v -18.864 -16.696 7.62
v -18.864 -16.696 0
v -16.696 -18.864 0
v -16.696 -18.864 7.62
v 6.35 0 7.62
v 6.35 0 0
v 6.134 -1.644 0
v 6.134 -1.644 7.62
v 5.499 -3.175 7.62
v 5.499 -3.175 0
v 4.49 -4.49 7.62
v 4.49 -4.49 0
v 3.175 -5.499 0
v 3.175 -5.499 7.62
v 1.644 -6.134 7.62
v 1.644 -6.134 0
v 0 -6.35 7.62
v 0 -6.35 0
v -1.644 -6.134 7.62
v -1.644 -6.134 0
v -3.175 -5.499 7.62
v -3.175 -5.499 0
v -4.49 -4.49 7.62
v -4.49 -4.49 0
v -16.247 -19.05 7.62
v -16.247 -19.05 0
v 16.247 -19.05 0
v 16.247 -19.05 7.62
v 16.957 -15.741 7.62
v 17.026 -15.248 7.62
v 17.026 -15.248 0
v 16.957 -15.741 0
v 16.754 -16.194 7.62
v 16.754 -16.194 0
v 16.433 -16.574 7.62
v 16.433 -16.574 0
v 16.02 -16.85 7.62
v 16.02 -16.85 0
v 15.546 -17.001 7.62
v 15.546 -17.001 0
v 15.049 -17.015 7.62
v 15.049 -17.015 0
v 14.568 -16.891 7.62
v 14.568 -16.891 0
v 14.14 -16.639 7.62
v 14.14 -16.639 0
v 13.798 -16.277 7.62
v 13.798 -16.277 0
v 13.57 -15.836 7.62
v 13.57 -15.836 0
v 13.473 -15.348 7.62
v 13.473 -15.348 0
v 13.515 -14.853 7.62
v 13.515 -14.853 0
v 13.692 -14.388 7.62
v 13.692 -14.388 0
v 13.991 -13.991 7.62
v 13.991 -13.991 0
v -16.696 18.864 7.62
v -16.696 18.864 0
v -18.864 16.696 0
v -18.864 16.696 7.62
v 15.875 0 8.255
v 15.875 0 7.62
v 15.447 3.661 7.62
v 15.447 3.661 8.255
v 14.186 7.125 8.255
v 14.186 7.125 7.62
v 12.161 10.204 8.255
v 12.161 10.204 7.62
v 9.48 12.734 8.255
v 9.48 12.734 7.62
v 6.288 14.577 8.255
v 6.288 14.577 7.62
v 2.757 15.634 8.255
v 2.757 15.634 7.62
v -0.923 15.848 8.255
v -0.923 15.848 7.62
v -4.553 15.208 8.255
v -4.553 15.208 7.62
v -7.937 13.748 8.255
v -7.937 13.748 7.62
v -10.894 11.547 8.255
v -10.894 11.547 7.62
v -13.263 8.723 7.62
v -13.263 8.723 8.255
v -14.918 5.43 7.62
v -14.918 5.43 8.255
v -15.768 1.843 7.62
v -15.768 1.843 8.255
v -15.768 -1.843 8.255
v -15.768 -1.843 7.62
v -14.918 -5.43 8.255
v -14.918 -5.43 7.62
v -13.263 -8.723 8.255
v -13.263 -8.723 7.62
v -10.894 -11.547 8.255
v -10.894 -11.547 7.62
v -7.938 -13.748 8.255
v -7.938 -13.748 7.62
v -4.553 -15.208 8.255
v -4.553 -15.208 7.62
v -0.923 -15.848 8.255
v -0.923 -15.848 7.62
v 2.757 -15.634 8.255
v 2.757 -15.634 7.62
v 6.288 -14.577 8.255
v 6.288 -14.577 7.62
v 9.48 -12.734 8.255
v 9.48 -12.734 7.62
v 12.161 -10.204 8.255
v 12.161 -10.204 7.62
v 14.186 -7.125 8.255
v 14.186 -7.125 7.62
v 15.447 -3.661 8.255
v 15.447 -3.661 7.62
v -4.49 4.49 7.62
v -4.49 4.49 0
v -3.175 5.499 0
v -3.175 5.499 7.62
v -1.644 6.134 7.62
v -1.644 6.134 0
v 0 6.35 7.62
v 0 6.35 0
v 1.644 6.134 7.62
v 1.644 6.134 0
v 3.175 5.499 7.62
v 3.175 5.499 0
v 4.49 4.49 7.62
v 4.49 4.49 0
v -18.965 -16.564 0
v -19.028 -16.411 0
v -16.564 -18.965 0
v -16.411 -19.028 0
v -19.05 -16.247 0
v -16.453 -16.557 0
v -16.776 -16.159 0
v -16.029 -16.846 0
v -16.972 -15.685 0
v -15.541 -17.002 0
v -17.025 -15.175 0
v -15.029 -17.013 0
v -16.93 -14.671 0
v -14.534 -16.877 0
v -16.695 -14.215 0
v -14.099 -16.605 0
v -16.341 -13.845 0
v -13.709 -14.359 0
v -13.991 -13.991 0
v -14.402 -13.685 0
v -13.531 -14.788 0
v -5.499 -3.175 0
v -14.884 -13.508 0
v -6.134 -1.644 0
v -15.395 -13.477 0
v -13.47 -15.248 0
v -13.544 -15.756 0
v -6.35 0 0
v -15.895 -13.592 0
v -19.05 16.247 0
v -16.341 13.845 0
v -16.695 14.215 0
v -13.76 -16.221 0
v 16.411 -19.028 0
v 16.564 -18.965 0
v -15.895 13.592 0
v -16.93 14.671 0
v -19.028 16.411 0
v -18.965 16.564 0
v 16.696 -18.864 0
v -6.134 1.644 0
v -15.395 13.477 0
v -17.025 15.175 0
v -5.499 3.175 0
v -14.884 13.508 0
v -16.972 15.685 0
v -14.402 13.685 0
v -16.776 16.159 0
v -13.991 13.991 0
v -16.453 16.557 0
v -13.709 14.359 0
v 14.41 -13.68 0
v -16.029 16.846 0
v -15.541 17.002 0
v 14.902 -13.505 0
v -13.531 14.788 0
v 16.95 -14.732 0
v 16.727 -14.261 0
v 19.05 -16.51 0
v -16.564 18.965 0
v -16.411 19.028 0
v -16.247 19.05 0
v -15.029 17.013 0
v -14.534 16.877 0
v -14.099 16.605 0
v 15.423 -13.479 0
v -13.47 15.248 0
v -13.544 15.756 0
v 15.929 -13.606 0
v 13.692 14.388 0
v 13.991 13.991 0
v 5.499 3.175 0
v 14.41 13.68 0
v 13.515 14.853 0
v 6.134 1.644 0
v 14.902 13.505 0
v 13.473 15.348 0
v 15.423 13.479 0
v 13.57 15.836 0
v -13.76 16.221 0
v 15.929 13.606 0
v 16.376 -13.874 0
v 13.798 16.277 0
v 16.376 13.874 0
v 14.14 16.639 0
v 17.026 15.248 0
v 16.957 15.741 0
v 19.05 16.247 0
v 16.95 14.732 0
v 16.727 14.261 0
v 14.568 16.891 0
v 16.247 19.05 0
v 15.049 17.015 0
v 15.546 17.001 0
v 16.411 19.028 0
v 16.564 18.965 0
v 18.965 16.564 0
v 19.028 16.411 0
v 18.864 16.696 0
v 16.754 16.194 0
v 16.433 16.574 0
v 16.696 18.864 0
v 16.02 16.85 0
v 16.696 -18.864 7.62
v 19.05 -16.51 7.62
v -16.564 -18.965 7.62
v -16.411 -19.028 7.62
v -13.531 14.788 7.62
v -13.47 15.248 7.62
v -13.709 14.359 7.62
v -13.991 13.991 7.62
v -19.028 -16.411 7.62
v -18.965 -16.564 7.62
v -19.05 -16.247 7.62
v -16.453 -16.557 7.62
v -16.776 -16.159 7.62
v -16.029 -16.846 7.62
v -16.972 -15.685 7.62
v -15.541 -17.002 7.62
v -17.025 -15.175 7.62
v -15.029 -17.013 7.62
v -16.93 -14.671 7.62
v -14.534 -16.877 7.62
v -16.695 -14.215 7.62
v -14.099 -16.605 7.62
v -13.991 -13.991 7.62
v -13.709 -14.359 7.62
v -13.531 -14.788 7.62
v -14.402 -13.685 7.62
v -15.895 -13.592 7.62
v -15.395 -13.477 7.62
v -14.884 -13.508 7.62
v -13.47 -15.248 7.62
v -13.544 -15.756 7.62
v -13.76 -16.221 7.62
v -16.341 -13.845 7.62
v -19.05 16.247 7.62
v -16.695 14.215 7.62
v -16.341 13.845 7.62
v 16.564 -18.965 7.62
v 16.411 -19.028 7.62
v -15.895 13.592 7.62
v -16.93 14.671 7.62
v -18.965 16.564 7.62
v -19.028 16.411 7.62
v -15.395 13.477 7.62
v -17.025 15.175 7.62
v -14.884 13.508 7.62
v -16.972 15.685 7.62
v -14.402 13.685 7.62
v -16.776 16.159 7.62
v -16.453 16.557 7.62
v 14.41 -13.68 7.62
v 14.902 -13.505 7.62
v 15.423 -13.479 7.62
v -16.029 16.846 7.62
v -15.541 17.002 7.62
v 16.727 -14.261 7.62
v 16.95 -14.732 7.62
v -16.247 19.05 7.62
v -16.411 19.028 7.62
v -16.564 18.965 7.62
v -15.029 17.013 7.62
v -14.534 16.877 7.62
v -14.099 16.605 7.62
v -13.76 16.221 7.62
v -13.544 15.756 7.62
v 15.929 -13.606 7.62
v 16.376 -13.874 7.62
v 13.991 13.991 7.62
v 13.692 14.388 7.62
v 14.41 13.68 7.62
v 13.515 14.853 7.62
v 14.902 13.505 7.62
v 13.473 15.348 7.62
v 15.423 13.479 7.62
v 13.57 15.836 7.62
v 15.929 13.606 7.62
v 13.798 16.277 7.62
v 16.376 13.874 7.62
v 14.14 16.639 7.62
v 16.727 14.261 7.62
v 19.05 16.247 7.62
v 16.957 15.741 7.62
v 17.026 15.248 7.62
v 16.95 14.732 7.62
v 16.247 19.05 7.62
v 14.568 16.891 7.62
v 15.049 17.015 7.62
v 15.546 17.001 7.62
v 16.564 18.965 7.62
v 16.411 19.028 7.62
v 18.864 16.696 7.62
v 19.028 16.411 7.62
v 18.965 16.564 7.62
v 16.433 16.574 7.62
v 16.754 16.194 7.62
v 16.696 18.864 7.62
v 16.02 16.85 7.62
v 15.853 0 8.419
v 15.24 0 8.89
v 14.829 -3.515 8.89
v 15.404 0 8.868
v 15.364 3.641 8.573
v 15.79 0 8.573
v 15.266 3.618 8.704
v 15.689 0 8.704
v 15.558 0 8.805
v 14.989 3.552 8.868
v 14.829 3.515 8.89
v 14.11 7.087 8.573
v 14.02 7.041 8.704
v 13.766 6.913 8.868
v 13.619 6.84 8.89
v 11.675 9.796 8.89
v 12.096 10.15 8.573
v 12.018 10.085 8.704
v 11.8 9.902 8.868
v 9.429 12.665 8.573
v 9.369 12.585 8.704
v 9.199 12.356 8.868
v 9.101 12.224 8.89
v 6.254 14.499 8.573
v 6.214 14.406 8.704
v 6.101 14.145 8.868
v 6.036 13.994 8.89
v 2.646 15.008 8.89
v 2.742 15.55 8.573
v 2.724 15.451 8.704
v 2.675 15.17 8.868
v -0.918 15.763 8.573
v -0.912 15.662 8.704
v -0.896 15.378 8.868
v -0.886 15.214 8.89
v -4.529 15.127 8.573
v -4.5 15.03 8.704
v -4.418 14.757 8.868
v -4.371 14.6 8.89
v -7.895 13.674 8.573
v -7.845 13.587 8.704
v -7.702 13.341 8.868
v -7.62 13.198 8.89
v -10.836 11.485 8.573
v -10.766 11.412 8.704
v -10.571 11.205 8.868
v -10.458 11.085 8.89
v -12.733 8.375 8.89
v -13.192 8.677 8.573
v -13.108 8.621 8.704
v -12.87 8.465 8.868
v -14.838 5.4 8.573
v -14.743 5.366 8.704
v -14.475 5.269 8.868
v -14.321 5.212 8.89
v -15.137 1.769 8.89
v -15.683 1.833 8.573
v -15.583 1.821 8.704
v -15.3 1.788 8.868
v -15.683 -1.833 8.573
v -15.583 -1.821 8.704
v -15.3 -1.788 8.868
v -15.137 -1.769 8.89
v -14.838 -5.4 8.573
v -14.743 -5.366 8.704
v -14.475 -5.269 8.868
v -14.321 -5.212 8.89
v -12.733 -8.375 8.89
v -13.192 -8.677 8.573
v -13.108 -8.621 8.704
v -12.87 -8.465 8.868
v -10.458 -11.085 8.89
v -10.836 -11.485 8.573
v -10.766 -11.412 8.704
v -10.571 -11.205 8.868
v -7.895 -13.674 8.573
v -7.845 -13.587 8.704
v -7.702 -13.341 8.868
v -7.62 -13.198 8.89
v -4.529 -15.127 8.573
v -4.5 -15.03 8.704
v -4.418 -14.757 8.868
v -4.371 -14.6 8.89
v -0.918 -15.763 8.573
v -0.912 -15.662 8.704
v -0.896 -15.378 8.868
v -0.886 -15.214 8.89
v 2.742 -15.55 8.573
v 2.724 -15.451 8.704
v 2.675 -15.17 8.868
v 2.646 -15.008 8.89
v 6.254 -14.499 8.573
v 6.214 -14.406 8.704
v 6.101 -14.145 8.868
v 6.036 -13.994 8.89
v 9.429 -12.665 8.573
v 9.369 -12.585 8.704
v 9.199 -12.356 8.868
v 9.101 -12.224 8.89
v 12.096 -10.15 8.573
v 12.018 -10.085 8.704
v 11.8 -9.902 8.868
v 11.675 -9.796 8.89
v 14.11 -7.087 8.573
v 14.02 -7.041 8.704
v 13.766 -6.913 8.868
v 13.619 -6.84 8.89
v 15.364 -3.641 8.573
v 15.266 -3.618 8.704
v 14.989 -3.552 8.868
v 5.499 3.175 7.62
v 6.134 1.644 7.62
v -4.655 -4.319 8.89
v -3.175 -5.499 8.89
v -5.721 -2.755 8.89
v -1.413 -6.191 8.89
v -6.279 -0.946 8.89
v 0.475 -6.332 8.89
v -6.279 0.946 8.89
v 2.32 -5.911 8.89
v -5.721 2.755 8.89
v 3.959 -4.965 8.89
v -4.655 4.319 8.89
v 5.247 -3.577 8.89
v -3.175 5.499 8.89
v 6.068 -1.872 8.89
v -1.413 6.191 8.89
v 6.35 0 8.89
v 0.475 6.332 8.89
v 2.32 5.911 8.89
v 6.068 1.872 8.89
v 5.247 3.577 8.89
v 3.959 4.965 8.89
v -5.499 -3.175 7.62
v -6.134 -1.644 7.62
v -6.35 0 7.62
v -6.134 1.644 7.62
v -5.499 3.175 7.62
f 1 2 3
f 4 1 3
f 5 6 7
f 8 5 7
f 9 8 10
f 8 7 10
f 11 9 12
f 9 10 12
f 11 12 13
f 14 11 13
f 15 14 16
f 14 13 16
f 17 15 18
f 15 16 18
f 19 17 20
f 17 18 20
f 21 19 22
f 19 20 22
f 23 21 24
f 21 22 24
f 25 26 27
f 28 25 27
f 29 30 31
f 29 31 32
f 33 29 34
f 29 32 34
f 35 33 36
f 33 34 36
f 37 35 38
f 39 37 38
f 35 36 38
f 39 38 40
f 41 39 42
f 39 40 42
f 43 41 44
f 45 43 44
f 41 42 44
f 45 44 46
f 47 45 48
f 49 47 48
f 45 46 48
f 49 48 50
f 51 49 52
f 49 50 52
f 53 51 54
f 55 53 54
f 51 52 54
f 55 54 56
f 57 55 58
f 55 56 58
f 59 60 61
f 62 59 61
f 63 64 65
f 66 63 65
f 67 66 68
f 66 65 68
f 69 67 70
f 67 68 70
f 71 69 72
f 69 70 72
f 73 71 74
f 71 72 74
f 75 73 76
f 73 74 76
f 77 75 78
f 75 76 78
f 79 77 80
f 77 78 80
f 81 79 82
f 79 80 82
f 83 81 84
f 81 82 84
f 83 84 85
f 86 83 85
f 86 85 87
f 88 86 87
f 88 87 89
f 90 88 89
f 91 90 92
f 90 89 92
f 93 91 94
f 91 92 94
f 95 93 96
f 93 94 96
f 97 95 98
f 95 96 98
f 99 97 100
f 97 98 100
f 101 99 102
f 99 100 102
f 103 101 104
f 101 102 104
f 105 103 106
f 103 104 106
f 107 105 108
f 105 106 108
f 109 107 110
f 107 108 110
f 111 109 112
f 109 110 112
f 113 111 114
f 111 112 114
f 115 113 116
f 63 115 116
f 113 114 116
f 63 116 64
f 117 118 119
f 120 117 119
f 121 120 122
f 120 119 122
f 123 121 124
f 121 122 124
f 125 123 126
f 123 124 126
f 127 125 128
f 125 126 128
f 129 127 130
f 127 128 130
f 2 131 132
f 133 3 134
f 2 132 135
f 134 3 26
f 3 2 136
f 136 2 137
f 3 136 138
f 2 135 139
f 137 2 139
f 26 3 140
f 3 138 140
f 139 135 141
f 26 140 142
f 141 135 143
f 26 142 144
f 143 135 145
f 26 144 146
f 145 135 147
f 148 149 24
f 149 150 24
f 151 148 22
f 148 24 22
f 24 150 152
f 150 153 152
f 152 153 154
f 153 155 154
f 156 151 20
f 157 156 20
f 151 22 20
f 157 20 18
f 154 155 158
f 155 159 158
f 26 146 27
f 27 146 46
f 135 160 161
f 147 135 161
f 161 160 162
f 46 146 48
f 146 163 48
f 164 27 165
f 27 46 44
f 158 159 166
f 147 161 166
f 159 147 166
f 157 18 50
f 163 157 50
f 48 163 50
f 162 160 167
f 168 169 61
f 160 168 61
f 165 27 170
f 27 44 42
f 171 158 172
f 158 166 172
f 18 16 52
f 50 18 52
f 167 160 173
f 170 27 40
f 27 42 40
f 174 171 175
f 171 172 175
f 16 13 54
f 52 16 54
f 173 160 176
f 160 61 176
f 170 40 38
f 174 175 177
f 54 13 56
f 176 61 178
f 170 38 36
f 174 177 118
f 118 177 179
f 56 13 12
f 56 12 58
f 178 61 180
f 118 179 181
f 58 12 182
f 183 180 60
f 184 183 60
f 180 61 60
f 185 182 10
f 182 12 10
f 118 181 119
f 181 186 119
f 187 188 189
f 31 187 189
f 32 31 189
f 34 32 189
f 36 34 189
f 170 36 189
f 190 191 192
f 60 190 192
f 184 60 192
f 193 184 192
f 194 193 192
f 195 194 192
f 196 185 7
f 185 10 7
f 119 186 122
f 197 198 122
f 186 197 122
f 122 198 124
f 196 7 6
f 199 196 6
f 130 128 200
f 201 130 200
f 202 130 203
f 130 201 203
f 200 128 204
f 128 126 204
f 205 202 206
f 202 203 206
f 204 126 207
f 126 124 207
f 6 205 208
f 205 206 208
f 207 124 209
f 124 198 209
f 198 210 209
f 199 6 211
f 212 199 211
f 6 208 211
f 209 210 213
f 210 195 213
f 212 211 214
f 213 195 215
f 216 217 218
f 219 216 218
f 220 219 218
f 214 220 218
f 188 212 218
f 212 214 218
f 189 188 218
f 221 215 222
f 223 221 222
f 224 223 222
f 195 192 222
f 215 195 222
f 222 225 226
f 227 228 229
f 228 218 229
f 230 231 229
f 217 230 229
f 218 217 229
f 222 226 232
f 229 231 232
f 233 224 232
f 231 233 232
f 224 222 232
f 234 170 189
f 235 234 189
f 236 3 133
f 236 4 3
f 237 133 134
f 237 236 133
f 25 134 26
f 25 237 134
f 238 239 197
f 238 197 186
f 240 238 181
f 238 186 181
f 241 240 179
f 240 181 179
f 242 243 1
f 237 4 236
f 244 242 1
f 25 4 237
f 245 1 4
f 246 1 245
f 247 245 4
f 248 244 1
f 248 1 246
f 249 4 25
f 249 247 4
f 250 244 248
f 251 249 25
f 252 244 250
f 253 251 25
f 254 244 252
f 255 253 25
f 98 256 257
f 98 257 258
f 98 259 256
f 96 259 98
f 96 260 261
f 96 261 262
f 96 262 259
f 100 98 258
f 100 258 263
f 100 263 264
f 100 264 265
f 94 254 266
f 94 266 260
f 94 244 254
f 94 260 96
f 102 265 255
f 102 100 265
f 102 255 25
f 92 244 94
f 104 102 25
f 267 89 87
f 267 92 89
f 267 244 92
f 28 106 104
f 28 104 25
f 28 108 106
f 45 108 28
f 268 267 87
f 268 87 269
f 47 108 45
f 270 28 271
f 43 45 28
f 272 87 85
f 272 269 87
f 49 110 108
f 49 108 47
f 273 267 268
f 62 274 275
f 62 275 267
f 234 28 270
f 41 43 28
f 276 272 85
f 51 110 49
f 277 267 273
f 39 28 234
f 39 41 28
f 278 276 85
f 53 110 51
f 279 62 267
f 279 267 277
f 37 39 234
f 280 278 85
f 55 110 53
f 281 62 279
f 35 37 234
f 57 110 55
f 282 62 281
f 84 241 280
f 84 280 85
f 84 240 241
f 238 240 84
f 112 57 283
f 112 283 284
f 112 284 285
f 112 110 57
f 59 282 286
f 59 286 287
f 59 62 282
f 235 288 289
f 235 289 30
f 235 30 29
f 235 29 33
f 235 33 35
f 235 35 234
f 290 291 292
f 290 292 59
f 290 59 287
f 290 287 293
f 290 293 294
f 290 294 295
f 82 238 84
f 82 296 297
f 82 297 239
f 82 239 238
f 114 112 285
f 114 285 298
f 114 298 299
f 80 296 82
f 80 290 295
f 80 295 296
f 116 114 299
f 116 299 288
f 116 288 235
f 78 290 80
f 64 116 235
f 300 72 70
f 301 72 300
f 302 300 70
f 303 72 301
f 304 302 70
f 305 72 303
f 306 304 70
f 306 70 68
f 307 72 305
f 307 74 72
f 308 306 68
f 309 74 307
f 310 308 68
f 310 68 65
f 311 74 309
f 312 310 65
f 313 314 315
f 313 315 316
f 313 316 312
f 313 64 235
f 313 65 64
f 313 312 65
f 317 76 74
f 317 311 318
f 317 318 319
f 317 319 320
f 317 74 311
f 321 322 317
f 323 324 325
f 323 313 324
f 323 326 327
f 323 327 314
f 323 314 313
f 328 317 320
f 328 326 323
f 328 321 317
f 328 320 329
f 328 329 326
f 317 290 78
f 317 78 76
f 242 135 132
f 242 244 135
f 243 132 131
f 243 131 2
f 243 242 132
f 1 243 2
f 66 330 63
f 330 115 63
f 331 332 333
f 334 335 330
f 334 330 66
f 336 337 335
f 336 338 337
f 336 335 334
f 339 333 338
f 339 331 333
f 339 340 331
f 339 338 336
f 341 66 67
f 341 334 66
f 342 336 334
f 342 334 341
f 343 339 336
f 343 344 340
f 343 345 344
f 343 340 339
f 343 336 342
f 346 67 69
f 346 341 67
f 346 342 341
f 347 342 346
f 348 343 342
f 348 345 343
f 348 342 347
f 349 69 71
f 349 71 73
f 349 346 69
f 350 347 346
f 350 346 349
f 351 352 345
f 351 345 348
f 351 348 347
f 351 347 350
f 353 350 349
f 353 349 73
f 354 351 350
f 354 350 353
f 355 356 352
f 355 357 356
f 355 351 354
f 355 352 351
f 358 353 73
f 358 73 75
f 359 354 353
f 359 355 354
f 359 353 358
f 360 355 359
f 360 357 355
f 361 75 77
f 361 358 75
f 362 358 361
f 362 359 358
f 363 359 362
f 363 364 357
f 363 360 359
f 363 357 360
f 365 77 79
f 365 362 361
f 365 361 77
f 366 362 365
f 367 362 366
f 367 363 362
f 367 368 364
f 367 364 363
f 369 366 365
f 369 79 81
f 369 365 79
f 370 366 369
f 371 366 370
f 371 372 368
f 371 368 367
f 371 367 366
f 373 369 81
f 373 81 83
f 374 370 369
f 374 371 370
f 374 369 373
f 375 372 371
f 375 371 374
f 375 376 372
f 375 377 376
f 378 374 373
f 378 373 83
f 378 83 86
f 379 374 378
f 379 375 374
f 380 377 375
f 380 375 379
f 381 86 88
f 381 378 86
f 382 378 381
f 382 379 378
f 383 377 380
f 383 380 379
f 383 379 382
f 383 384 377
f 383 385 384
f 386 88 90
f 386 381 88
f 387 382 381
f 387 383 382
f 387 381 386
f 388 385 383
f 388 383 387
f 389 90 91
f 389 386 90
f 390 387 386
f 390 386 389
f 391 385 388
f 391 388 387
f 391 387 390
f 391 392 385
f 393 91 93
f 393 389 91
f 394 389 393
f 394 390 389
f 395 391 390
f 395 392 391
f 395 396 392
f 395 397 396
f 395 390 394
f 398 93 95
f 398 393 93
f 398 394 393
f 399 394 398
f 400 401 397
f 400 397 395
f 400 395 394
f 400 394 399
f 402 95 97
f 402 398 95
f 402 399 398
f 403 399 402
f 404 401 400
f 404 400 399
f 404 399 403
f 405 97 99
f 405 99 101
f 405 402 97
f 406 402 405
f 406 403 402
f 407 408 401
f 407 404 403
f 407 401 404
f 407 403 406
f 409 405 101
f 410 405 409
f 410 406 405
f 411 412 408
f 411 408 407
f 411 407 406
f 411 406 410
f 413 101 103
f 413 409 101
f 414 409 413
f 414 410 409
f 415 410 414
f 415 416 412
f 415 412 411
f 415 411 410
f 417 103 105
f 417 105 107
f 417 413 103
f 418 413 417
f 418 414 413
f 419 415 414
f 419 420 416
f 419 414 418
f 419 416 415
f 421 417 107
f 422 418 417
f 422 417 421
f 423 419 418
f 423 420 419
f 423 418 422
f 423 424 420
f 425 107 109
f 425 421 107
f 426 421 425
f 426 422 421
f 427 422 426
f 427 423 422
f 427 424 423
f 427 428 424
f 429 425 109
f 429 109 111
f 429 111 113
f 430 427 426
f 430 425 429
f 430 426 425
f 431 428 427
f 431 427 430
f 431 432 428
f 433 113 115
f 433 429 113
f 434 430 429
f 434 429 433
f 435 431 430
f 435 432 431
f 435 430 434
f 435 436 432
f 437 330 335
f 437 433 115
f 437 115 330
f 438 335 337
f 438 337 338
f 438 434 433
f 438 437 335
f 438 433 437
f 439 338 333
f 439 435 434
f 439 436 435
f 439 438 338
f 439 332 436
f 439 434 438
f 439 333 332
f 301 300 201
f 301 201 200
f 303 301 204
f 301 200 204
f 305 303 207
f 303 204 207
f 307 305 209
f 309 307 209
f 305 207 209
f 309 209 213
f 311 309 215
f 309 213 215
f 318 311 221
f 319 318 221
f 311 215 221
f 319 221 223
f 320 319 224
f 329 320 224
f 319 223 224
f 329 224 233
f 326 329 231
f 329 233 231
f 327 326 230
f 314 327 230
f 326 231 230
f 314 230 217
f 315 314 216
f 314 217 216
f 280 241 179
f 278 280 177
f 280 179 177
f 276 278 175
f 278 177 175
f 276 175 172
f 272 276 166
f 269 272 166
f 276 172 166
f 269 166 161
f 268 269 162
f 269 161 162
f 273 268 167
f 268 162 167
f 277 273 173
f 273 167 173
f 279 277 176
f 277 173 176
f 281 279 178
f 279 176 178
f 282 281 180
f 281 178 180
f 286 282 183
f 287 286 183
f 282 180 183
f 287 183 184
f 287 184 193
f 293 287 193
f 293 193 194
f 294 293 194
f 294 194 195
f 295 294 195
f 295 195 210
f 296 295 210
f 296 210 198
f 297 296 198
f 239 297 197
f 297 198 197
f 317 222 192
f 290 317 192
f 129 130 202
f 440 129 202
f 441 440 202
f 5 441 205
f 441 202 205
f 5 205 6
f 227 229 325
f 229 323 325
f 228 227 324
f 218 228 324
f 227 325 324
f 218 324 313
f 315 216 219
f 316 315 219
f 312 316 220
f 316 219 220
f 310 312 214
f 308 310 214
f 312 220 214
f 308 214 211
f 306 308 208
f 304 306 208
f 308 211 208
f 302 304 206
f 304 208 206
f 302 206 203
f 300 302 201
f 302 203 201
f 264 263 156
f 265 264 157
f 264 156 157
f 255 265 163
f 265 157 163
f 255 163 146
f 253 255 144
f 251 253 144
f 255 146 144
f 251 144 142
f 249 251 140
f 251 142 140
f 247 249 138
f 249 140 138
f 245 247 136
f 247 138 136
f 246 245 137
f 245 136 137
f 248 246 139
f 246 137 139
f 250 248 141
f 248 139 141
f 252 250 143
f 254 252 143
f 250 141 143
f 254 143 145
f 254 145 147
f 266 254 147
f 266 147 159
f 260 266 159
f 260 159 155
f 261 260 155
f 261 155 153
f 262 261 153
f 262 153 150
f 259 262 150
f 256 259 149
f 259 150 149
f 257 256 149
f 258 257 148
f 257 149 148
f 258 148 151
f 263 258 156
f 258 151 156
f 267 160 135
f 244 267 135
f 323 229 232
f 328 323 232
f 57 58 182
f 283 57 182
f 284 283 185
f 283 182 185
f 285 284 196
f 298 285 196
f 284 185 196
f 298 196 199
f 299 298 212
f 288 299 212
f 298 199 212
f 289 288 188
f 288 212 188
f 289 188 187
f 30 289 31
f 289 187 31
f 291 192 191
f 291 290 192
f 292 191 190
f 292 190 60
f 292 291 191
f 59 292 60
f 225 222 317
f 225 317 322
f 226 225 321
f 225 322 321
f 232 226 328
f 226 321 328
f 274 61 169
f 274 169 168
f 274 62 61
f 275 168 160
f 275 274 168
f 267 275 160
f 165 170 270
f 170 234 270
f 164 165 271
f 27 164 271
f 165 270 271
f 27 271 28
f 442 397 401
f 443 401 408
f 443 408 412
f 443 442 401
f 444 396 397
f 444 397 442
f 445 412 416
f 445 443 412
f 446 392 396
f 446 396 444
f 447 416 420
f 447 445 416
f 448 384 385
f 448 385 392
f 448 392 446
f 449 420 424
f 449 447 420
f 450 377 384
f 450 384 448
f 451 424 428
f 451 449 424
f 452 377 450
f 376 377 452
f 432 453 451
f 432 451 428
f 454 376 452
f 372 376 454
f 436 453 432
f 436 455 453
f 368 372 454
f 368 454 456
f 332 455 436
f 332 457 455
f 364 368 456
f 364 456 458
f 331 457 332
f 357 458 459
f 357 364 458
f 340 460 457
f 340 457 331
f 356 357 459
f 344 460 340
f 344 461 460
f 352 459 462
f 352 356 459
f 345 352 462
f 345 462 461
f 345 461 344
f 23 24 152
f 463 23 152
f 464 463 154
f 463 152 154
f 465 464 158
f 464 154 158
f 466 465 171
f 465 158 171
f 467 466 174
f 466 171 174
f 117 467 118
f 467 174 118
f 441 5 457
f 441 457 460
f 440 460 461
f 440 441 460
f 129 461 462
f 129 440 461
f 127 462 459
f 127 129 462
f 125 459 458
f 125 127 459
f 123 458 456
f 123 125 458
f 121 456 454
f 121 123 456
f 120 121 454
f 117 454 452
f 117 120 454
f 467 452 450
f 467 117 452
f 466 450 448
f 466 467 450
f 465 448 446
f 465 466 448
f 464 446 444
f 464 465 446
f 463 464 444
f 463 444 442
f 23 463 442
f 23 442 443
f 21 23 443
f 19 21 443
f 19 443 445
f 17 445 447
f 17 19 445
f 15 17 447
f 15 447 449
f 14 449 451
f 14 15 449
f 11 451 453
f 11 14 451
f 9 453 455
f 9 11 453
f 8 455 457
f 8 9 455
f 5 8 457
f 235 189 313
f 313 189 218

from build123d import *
from build123d import SkipClean  # not in build123d's __all__

# Parameters (mm, degrees)
F1_DEPTH = 7.62
F2_R     = 15.875
F2_R_2   = 6.35
F3_DEPTH = 1.27
F4_R     = 0.635


with BuildPart() as f1:
    # F0 (on Top) → F1 (new body)
    with BuildSketch(Plane.XY):
        Polygon((16.51, 19.05), (-16.51, 19.05), (-19.05, 16.51), (-19.05, -16.51), (-16.51, -19.05), (16.51, -19.05), (19.05, -16.51), (19.05, 0), (19.05, 16.51), align=None)
        with BuildLine():
            ThreePointArc((-13.4704748936, -15.2484748936), (-16.8911327024, -15.9288860363), (-13.9912390366, -13.9912390366))
            ThreePointArc((-13.9912390366, -13.9912390366), (-13.6058170848, -14.5680637508), (-13.4704748936, -15.2484748936))
        make_face(mode=Mode.SUBTRACT)
        with BuildLine():
            ThreePointArc((17.0264748936, -15.2484748936), (14.5680637508, -16.8911327024), (13.9912390366, -13.9912390366))
            ThreePointArc((13.9912390366, -13.9912390366), (15.9288860363, -13.6058170848), (17.0264748936, -15.2484748936))
        make_face(mode=Mode.SUBTRACT)
        with BuildLine():
            ThreePointArc((-13.4704748936, 15.2484748936), (-13.6058170848, 14.5680637508), (-13.9912390366, 13.9912390366))
            ThreePointArc((-13.9912390366, 13.9912390366), (-16.8911327024, 15.9288860363), (-13.4704748936, 15.2484748936))
        make_face(mode=Mode.SUBTRACT)
        with BuildLine():
            ThreePointArc((4.4901280605, 4.4901280605), (5.8666350314, 2.4300397955), (6.35, 0))
            ThreePointArc((6.35, 0), (5.8666350314, -2.4300397955), (4.4901280605, -4.4901280605))
            ThreePointArc((4.4901280605, -4.4901280605), (0, -6.35), (-4.4901280605, -4.4901280605))
            ThreePointArc((-4.4901280605, -4.4901280605), (-6.35, 0), (-4.4901280605, 4.4901280605))
            ThreePointArc((-4.4901280605, 4.4901280605), (0, 6.35), (4.4901280605, 4.4901280605))
        make_face(mode=Mode.SUBTRACT)
        with BuildLine():
            ThreePointArc((17.0264748936, 15.2484748936), (15.9288860363, 13.6058170848), (13.9912390366, 13.9912390366))
            ThreePointArc((13.9912390366, 13.9912390366), (14.5680637508, 16.8911327024), (17.0264748936, 15.2484748936))
        make_face(mode=Mode.SUBTRACT)
    extrude(amount=F1_DEPTH)

    # F2 (on face) → F3 (join)
    with BuildSketch(Plane.XY.offset(7.62)):
        Circle(F2_R)
        Circle(F2_R_2, mode=Mode.SUBTRACT)
    with SkipClean():  # cleaning this boolean's faces spoils the solid; the shape is the same uncleaned
        extrude(amount=F3_DEPTH)

    # F4
    f4_edges = [f1.edges().sort_by_distance(p)[0] for p in [
        (-15.875, 0, 8.89),
        (-19.05, 16.51, 3.81),
        (-19.05, -16.51, 3.81),
        (-16.51, -19.05, 3.81),
        (16.51, -19.05, 3.81),
        (19.05, 16.51, 3.81),
        (16.51, 19.05, 3.81),
        (-16.51, 19.05, 3.81),
    ]]
    fillet(f4_edges, radius=F4_R)


solid = f1.part
